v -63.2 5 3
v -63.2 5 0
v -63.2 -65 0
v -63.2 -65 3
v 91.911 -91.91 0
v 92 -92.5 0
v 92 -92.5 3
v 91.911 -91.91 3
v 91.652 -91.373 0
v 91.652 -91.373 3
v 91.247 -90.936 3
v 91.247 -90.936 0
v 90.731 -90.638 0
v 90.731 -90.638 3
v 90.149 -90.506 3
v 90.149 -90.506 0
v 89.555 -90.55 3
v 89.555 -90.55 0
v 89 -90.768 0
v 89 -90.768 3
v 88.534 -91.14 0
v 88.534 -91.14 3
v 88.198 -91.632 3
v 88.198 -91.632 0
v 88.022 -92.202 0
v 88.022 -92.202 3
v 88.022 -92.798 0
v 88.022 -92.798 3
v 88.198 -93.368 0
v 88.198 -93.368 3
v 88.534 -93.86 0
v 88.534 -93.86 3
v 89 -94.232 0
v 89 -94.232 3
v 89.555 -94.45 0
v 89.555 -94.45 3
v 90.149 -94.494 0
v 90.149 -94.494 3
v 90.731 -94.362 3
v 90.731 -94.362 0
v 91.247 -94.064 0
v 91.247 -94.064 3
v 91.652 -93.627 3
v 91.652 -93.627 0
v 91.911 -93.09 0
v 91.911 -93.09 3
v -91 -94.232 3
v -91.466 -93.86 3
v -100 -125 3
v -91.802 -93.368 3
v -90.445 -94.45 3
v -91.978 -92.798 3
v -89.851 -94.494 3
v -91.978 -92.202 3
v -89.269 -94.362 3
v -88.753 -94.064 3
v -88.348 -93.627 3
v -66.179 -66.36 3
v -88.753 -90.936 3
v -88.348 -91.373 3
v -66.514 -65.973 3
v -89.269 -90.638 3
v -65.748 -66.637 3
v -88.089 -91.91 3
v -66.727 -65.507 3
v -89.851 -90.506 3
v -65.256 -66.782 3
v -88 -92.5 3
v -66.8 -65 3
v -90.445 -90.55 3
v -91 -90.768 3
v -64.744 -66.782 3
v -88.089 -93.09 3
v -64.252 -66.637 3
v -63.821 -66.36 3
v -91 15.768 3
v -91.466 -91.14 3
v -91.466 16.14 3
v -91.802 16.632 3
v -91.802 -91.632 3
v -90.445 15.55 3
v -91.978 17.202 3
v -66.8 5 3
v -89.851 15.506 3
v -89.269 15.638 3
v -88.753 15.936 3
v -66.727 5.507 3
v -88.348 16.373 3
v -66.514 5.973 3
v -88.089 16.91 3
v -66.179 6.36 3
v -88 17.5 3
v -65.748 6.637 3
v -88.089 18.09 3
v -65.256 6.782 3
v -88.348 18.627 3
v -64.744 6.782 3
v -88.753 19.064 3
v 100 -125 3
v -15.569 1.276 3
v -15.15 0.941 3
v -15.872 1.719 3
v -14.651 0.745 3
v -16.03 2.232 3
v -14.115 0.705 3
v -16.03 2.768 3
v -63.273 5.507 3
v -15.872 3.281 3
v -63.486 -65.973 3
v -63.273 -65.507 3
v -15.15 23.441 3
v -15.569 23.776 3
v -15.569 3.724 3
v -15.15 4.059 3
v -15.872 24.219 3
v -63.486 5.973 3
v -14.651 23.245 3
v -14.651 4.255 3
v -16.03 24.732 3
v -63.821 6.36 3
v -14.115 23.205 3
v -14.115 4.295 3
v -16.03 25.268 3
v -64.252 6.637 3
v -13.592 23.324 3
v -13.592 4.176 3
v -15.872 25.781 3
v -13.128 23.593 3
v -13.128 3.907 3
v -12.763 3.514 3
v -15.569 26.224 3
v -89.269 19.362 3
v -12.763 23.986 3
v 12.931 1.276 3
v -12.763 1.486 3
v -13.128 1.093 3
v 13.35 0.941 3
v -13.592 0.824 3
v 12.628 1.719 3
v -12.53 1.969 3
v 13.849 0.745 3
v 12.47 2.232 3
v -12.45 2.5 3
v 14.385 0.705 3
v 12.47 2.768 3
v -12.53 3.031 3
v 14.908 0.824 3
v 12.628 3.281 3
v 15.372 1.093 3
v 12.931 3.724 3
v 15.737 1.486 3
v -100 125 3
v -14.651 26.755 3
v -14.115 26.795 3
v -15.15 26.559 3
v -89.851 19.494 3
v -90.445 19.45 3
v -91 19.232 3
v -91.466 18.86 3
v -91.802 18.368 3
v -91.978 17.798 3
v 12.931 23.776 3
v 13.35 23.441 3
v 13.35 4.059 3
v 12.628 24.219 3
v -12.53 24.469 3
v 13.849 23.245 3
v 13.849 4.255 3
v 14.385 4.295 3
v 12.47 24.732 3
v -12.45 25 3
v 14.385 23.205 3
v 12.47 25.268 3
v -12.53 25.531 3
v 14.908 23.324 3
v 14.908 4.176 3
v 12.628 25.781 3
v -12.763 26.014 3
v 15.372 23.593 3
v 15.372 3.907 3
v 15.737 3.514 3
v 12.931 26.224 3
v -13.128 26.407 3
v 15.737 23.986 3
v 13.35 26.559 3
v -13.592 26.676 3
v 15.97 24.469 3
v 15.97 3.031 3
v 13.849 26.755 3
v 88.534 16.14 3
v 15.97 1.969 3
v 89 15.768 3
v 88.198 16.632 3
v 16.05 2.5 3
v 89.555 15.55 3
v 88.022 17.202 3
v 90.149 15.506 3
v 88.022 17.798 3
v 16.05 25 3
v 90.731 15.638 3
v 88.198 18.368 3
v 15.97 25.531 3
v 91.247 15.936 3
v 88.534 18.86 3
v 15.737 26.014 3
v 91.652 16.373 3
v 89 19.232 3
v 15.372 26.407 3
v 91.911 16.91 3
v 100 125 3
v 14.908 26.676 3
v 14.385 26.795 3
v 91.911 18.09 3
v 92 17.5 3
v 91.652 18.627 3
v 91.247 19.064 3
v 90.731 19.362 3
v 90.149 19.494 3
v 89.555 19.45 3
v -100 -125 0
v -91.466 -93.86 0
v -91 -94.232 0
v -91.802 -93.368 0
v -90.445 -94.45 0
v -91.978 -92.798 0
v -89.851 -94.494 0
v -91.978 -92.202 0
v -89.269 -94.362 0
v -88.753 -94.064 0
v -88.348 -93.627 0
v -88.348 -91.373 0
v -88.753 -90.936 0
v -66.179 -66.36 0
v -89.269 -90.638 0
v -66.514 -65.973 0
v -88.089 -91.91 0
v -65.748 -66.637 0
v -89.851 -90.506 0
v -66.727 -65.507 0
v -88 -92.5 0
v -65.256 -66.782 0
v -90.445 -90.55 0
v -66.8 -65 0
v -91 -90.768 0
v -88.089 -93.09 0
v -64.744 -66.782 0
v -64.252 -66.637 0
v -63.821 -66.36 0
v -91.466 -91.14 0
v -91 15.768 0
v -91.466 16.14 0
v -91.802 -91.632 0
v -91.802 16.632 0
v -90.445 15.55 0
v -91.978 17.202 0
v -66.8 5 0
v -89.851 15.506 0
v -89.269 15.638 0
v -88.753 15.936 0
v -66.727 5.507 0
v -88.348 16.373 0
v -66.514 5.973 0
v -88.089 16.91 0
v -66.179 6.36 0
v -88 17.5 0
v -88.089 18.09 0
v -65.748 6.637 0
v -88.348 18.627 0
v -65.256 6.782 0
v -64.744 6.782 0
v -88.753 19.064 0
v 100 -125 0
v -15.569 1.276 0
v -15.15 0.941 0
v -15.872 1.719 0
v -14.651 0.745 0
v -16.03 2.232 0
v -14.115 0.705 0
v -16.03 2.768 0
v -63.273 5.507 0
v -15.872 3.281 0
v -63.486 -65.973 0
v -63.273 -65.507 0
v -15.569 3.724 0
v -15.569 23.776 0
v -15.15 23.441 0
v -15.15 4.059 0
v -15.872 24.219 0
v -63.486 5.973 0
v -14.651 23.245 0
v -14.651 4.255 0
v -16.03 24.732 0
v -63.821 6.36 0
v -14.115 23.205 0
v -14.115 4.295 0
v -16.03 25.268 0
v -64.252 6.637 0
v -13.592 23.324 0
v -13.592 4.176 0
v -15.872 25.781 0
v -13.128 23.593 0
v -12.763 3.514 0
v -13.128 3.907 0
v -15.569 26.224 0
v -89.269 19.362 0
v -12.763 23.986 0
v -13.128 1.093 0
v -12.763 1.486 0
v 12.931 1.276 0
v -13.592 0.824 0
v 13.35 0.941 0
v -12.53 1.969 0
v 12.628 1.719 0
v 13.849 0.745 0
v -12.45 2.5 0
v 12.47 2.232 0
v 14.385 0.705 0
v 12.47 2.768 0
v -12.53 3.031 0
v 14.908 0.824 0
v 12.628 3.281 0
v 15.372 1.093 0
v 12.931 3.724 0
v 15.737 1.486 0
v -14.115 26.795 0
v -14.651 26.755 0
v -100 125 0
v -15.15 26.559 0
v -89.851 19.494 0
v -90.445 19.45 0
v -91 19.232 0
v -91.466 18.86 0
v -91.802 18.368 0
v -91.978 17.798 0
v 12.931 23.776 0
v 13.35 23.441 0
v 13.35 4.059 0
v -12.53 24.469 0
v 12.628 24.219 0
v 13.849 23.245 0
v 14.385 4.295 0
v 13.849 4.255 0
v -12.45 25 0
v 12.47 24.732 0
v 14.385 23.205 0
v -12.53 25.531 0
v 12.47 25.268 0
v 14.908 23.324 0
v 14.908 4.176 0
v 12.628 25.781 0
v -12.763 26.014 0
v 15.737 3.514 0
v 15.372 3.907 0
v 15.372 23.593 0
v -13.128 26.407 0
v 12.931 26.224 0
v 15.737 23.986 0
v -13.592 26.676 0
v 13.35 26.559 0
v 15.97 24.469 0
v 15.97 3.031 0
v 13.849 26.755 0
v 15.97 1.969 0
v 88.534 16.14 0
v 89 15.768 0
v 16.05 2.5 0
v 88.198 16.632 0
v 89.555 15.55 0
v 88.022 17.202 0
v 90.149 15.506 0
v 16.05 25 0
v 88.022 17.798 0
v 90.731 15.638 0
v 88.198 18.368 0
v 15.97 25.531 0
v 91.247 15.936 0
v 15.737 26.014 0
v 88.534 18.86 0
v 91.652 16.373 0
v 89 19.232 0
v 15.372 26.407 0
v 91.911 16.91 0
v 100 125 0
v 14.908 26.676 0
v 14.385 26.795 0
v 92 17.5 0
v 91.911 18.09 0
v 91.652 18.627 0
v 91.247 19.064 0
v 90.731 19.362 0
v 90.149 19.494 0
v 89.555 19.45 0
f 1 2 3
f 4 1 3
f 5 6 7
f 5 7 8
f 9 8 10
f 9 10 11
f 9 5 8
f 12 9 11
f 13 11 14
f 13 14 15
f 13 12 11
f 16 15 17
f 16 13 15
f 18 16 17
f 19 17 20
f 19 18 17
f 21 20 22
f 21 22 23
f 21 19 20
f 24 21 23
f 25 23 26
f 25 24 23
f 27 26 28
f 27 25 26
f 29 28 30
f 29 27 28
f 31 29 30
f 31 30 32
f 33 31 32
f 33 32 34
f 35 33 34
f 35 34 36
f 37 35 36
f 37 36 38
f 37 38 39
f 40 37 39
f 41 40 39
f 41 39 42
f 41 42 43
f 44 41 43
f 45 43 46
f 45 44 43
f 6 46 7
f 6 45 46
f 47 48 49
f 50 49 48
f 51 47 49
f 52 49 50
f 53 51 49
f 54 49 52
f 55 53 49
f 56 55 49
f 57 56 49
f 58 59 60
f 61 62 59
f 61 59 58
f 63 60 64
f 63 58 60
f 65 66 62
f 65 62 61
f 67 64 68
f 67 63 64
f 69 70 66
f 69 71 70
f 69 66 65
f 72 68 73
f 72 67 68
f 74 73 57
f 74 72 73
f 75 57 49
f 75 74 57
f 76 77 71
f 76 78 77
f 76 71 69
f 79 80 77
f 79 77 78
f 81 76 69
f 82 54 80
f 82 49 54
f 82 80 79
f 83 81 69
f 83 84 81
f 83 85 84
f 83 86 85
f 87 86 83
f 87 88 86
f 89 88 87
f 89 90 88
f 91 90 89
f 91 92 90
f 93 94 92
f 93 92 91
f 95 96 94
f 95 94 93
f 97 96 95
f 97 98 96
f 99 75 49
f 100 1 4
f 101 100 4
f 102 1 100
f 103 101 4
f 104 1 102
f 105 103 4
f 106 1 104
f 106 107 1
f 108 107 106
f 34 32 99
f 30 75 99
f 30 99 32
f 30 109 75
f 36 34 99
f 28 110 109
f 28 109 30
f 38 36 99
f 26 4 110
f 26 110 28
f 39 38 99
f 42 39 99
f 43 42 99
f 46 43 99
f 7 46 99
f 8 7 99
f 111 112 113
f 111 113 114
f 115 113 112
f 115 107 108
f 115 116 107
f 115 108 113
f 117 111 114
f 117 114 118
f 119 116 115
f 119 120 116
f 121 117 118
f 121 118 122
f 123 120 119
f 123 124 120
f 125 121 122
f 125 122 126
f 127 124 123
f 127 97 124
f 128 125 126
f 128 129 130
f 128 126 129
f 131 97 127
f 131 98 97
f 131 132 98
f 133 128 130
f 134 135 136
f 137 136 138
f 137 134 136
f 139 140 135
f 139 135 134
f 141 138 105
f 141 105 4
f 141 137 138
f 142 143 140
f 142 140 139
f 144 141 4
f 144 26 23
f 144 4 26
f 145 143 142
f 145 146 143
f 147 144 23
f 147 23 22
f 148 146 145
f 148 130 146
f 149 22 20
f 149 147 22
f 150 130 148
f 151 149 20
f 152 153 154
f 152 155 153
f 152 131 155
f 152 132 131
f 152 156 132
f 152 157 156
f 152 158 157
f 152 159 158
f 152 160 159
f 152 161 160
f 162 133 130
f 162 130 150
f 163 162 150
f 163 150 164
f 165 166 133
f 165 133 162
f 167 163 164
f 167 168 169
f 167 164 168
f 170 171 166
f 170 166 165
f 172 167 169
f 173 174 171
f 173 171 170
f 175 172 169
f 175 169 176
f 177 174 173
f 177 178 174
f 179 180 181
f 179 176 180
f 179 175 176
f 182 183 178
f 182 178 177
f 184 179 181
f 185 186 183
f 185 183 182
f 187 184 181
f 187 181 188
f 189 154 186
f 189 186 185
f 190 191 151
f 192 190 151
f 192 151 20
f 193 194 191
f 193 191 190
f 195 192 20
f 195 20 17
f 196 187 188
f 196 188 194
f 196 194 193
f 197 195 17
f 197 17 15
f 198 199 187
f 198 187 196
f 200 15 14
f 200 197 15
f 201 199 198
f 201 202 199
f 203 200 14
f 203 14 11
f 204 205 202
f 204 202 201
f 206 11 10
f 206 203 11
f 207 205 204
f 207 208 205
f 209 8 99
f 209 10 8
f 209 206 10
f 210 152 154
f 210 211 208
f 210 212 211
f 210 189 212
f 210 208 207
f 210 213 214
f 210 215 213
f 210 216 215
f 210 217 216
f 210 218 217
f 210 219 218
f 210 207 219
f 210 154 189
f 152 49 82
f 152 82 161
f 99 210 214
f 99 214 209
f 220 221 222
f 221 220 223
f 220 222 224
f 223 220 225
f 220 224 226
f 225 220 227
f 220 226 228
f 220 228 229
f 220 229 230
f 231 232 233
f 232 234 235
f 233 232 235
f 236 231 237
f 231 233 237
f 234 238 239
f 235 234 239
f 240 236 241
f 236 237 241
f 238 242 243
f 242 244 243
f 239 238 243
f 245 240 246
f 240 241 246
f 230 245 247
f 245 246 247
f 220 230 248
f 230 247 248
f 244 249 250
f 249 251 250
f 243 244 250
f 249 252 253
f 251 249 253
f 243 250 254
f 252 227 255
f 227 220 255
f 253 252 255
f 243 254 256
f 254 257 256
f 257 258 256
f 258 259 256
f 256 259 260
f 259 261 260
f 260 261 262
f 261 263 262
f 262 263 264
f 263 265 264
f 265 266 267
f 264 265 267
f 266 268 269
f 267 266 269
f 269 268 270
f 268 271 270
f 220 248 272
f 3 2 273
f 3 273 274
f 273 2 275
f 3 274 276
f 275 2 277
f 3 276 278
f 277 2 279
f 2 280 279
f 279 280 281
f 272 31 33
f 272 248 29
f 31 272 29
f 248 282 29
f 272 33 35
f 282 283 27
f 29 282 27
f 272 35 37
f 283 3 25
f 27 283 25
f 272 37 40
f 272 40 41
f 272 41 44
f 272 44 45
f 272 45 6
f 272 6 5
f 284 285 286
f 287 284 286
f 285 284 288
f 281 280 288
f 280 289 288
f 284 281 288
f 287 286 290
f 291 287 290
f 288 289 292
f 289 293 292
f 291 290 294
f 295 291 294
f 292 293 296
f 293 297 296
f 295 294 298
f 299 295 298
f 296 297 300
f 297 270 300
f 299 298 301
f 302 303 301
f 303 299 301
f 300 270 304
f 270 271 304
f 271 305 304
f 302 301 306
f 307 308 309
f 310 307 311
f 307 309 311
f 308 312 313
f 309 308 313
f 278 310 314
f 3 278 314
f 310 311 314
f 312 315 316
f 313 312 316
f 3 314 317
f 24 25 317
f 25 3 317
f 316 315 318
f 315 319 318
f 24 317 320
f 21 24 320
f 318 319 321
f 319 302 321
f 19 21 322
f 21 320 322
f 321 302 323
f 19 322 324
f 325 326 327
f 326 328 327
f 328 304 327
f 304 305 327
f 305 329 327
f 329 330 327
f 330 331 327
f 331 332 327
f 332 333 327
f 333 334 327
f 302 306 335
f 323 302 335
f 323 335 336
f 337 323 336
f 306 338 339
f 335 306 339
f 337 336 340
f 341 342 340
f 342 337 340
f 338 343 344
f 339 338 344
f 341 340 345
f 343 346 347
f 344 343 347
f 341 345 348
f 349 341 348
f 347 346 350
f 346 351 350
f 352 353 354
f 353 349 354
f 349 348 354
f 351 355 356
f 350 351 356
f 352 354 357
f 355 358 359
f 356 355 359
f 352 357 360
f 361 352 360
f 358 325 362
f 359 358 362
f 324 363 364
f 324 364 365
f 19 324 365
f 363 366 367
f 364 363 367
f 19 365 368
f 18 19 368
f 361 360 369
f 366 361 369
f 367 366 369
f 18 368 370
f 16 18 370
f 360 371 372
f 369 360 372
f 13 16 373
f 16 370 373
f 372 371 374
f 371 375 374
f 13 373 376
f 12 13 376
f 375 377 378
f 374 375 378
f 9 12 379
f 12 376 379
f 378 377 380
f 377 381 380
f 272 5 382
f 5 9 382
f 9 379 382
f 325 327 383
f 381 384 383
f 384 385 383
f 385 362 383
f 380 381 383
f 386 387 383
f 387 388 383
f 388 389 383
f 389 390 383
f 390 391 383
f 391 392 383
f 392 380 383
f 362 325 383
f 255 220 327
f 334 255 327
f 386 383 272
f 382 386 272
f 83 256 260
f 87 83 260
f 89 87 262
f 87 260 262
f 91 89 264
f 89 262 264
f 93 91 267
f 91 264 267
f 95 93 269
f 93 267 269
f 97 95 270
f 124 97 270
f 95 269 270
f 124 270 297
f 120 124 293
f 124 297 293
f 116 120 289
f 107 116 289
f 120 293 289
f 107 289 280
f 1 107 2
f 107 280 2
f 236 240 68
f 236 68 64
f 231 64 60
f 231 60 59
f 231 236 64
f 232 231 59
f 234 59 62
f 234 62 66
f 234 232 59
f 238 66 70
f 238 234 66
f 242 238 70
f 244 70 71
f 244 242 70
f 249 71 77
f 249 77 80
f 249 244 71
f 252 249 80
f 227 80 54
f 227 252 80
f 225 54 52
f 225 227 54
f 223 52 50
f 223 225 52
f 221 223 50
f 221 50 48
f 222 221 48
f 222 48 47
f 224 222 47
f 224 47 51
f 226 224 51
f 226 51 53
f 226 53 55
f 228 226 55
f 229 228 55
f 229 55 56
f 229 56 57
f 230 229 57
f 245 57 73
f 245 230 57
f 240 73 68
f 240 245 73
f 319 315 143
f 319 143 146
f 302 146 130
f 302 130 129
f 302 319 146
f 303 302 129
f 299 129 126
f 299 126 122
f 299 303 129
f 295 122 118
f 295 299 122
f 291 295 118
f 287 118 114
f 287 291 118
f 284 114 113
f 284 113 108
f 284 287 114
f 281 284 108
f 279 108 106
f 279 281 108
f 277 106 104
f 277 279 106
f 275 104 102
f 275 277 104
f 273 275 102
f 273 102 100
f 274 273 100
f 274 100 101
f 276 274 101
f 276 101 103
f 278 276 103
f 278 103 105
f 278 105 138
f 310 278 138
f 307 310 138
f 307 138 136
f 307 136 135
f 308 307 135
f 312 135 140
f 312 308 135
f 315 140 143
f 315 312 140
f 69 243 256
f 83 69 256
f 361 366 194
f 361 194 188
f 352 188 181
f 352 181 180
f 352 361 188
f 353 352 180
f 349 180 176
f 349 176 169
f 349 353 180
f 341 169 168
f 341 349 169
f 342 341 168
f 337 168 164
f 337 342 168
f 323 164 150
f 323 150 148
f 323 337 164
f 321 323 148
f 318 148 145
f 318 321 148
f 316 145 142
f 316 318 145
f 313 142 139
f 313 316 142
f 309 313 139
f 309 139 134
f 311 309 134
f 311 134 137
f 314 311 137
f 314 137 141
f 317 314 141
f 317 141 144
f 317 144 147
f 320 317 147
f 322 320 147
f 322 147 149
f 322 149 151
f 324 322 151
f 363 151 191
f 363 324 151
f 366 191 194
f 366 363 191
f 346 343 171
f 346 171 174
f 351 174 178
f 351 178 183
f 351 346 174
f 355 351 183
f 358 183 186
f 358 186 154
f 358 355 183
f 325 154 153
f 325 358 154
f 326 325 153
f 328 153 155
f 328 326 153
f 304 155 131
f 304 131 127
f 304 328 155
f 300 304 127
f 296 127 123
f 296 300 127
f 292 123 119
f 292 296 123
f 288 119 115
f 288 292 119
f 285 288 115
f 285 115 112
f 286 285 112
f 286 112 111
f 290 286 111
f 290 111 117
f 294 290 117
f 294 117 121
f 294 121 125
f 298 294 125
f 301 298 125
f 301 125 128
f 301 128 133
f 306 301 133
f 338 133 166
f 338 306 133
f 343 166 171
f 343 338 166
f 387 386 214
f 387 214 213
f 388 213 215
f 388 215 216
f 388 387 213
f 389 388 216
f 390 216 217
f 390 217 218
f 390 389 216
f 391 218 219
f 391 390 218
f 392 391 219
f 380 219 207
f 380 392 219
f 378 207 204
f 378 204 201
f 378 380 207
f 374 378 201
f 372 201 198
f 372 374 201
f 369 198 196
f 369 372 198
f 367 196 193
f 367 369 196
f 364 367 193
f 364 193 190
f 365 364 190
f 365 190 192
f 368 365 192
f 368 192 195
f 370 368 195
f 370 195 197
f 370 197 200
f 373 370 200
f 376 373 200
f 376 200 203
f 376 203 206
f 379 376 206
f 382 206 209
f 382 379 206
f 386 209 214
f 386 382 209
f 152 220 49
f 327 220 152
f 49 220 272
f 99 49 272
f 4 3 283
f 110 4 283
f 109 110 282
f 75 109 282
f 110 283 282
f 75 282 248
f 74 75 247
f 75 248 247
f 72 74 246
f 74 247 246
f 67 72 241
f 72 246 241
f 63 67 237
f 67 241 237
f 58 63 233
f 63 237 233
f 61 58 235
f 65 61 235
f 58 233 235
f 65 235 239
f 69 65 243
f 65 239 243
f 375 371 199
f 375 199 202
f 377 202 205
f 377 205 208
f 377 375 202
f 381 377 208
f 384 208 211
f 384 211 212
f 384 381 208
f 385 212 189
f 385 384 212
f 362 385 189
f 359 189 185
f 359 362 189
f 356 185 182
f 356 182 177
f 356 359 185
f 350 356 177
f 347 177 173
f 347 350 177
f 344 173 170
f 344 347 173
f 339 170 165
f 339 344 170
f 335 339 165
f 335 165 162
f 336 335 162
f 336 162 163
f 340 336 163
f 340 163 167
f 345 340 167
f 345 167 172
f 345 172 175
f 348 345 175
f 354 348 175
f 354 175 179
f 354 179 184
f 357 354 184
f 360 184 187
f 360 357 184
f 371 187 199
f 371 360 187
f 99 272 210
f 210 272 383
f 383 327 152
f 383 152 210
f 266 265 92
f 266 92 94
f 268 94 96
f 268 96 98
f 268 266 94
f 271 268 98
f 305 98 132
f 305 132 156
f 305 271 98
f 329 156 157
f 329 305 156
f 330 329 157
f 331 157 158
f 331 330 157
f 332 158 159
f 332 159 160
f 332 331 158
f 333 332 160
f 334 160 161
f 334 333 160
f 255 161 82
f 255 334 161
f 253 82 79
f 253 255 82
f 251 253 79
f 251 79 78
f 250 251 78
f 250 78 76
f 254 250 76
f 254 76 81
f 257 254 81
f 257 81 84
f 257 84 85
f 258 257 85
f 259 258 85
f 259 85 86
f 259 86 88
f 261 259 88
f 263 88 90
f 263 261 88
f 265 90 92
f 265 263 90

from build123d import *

# Parameters (mm, degrees)
ESBO_O1_W                = 200
ESBO_O1_H                = 250
ESBO_O1_R                = 1.8
ESBO_O1_R_2              = 2
RESSALTO_EXTRUS_O1_DEPTH = 3


with BuildPart() as part:
    # Esboço1 → Ressalto-extrusão1 (new body)
    with BuildSketch(Plane.XY):
        Rectangle(ESBO_O1_W, ESBO_O1_H)
        with Locations((-14.25, 25)):
            Circle(ESBO_O1_R, mode=Mode.SUBTRACT)
        with Locations((14.25, 25)):
            Circle(ESBO_O1_R, mode=Mode.SUBTRACT)
        with Locations((14.25, 2.5)):
            Circle(ESBO_O1_R, mode=Mode.SUBTRACT)
        with Locations((-14.25, 2.5)):
            Circle(ESBO_O1_R, mode=Mode.SUBTRACT)
        with Locations((-90, -92.5)):
            Circle(ESBO_O1_R_2, mode=Mode.SUBTRACT)
        with Locations((-90, 17.5)):
            Circle(ESBO_O1_R_2, mode=Mode.SUBTRACT)
        with Locations((90, 17.5)):
            Circle(ESBO_O1_R_2, mode=Mode.SUBTRACT)
        with Locations((90, -92.5)):
            Circle(ESBO_O1_R_2, mode=Mode.SUBTRACT)
        with BuildLine():
            Line((-63.2, 5), (-63.2, -65))
            ThreePointArc((-63.2, -65), (-65, -66.8), (-66.8, -65))
            Line((-66.8, -65), (-66.8, 5))
            ThreePointArc((-66.8, 5), (-65, 6.8), (-63.2, 5))
        make_face(mode=Mode.SUBTRACT)
    extrude(amount=RESSALTO_EXTRUS_O1_DEPTH)


solid = part.part
